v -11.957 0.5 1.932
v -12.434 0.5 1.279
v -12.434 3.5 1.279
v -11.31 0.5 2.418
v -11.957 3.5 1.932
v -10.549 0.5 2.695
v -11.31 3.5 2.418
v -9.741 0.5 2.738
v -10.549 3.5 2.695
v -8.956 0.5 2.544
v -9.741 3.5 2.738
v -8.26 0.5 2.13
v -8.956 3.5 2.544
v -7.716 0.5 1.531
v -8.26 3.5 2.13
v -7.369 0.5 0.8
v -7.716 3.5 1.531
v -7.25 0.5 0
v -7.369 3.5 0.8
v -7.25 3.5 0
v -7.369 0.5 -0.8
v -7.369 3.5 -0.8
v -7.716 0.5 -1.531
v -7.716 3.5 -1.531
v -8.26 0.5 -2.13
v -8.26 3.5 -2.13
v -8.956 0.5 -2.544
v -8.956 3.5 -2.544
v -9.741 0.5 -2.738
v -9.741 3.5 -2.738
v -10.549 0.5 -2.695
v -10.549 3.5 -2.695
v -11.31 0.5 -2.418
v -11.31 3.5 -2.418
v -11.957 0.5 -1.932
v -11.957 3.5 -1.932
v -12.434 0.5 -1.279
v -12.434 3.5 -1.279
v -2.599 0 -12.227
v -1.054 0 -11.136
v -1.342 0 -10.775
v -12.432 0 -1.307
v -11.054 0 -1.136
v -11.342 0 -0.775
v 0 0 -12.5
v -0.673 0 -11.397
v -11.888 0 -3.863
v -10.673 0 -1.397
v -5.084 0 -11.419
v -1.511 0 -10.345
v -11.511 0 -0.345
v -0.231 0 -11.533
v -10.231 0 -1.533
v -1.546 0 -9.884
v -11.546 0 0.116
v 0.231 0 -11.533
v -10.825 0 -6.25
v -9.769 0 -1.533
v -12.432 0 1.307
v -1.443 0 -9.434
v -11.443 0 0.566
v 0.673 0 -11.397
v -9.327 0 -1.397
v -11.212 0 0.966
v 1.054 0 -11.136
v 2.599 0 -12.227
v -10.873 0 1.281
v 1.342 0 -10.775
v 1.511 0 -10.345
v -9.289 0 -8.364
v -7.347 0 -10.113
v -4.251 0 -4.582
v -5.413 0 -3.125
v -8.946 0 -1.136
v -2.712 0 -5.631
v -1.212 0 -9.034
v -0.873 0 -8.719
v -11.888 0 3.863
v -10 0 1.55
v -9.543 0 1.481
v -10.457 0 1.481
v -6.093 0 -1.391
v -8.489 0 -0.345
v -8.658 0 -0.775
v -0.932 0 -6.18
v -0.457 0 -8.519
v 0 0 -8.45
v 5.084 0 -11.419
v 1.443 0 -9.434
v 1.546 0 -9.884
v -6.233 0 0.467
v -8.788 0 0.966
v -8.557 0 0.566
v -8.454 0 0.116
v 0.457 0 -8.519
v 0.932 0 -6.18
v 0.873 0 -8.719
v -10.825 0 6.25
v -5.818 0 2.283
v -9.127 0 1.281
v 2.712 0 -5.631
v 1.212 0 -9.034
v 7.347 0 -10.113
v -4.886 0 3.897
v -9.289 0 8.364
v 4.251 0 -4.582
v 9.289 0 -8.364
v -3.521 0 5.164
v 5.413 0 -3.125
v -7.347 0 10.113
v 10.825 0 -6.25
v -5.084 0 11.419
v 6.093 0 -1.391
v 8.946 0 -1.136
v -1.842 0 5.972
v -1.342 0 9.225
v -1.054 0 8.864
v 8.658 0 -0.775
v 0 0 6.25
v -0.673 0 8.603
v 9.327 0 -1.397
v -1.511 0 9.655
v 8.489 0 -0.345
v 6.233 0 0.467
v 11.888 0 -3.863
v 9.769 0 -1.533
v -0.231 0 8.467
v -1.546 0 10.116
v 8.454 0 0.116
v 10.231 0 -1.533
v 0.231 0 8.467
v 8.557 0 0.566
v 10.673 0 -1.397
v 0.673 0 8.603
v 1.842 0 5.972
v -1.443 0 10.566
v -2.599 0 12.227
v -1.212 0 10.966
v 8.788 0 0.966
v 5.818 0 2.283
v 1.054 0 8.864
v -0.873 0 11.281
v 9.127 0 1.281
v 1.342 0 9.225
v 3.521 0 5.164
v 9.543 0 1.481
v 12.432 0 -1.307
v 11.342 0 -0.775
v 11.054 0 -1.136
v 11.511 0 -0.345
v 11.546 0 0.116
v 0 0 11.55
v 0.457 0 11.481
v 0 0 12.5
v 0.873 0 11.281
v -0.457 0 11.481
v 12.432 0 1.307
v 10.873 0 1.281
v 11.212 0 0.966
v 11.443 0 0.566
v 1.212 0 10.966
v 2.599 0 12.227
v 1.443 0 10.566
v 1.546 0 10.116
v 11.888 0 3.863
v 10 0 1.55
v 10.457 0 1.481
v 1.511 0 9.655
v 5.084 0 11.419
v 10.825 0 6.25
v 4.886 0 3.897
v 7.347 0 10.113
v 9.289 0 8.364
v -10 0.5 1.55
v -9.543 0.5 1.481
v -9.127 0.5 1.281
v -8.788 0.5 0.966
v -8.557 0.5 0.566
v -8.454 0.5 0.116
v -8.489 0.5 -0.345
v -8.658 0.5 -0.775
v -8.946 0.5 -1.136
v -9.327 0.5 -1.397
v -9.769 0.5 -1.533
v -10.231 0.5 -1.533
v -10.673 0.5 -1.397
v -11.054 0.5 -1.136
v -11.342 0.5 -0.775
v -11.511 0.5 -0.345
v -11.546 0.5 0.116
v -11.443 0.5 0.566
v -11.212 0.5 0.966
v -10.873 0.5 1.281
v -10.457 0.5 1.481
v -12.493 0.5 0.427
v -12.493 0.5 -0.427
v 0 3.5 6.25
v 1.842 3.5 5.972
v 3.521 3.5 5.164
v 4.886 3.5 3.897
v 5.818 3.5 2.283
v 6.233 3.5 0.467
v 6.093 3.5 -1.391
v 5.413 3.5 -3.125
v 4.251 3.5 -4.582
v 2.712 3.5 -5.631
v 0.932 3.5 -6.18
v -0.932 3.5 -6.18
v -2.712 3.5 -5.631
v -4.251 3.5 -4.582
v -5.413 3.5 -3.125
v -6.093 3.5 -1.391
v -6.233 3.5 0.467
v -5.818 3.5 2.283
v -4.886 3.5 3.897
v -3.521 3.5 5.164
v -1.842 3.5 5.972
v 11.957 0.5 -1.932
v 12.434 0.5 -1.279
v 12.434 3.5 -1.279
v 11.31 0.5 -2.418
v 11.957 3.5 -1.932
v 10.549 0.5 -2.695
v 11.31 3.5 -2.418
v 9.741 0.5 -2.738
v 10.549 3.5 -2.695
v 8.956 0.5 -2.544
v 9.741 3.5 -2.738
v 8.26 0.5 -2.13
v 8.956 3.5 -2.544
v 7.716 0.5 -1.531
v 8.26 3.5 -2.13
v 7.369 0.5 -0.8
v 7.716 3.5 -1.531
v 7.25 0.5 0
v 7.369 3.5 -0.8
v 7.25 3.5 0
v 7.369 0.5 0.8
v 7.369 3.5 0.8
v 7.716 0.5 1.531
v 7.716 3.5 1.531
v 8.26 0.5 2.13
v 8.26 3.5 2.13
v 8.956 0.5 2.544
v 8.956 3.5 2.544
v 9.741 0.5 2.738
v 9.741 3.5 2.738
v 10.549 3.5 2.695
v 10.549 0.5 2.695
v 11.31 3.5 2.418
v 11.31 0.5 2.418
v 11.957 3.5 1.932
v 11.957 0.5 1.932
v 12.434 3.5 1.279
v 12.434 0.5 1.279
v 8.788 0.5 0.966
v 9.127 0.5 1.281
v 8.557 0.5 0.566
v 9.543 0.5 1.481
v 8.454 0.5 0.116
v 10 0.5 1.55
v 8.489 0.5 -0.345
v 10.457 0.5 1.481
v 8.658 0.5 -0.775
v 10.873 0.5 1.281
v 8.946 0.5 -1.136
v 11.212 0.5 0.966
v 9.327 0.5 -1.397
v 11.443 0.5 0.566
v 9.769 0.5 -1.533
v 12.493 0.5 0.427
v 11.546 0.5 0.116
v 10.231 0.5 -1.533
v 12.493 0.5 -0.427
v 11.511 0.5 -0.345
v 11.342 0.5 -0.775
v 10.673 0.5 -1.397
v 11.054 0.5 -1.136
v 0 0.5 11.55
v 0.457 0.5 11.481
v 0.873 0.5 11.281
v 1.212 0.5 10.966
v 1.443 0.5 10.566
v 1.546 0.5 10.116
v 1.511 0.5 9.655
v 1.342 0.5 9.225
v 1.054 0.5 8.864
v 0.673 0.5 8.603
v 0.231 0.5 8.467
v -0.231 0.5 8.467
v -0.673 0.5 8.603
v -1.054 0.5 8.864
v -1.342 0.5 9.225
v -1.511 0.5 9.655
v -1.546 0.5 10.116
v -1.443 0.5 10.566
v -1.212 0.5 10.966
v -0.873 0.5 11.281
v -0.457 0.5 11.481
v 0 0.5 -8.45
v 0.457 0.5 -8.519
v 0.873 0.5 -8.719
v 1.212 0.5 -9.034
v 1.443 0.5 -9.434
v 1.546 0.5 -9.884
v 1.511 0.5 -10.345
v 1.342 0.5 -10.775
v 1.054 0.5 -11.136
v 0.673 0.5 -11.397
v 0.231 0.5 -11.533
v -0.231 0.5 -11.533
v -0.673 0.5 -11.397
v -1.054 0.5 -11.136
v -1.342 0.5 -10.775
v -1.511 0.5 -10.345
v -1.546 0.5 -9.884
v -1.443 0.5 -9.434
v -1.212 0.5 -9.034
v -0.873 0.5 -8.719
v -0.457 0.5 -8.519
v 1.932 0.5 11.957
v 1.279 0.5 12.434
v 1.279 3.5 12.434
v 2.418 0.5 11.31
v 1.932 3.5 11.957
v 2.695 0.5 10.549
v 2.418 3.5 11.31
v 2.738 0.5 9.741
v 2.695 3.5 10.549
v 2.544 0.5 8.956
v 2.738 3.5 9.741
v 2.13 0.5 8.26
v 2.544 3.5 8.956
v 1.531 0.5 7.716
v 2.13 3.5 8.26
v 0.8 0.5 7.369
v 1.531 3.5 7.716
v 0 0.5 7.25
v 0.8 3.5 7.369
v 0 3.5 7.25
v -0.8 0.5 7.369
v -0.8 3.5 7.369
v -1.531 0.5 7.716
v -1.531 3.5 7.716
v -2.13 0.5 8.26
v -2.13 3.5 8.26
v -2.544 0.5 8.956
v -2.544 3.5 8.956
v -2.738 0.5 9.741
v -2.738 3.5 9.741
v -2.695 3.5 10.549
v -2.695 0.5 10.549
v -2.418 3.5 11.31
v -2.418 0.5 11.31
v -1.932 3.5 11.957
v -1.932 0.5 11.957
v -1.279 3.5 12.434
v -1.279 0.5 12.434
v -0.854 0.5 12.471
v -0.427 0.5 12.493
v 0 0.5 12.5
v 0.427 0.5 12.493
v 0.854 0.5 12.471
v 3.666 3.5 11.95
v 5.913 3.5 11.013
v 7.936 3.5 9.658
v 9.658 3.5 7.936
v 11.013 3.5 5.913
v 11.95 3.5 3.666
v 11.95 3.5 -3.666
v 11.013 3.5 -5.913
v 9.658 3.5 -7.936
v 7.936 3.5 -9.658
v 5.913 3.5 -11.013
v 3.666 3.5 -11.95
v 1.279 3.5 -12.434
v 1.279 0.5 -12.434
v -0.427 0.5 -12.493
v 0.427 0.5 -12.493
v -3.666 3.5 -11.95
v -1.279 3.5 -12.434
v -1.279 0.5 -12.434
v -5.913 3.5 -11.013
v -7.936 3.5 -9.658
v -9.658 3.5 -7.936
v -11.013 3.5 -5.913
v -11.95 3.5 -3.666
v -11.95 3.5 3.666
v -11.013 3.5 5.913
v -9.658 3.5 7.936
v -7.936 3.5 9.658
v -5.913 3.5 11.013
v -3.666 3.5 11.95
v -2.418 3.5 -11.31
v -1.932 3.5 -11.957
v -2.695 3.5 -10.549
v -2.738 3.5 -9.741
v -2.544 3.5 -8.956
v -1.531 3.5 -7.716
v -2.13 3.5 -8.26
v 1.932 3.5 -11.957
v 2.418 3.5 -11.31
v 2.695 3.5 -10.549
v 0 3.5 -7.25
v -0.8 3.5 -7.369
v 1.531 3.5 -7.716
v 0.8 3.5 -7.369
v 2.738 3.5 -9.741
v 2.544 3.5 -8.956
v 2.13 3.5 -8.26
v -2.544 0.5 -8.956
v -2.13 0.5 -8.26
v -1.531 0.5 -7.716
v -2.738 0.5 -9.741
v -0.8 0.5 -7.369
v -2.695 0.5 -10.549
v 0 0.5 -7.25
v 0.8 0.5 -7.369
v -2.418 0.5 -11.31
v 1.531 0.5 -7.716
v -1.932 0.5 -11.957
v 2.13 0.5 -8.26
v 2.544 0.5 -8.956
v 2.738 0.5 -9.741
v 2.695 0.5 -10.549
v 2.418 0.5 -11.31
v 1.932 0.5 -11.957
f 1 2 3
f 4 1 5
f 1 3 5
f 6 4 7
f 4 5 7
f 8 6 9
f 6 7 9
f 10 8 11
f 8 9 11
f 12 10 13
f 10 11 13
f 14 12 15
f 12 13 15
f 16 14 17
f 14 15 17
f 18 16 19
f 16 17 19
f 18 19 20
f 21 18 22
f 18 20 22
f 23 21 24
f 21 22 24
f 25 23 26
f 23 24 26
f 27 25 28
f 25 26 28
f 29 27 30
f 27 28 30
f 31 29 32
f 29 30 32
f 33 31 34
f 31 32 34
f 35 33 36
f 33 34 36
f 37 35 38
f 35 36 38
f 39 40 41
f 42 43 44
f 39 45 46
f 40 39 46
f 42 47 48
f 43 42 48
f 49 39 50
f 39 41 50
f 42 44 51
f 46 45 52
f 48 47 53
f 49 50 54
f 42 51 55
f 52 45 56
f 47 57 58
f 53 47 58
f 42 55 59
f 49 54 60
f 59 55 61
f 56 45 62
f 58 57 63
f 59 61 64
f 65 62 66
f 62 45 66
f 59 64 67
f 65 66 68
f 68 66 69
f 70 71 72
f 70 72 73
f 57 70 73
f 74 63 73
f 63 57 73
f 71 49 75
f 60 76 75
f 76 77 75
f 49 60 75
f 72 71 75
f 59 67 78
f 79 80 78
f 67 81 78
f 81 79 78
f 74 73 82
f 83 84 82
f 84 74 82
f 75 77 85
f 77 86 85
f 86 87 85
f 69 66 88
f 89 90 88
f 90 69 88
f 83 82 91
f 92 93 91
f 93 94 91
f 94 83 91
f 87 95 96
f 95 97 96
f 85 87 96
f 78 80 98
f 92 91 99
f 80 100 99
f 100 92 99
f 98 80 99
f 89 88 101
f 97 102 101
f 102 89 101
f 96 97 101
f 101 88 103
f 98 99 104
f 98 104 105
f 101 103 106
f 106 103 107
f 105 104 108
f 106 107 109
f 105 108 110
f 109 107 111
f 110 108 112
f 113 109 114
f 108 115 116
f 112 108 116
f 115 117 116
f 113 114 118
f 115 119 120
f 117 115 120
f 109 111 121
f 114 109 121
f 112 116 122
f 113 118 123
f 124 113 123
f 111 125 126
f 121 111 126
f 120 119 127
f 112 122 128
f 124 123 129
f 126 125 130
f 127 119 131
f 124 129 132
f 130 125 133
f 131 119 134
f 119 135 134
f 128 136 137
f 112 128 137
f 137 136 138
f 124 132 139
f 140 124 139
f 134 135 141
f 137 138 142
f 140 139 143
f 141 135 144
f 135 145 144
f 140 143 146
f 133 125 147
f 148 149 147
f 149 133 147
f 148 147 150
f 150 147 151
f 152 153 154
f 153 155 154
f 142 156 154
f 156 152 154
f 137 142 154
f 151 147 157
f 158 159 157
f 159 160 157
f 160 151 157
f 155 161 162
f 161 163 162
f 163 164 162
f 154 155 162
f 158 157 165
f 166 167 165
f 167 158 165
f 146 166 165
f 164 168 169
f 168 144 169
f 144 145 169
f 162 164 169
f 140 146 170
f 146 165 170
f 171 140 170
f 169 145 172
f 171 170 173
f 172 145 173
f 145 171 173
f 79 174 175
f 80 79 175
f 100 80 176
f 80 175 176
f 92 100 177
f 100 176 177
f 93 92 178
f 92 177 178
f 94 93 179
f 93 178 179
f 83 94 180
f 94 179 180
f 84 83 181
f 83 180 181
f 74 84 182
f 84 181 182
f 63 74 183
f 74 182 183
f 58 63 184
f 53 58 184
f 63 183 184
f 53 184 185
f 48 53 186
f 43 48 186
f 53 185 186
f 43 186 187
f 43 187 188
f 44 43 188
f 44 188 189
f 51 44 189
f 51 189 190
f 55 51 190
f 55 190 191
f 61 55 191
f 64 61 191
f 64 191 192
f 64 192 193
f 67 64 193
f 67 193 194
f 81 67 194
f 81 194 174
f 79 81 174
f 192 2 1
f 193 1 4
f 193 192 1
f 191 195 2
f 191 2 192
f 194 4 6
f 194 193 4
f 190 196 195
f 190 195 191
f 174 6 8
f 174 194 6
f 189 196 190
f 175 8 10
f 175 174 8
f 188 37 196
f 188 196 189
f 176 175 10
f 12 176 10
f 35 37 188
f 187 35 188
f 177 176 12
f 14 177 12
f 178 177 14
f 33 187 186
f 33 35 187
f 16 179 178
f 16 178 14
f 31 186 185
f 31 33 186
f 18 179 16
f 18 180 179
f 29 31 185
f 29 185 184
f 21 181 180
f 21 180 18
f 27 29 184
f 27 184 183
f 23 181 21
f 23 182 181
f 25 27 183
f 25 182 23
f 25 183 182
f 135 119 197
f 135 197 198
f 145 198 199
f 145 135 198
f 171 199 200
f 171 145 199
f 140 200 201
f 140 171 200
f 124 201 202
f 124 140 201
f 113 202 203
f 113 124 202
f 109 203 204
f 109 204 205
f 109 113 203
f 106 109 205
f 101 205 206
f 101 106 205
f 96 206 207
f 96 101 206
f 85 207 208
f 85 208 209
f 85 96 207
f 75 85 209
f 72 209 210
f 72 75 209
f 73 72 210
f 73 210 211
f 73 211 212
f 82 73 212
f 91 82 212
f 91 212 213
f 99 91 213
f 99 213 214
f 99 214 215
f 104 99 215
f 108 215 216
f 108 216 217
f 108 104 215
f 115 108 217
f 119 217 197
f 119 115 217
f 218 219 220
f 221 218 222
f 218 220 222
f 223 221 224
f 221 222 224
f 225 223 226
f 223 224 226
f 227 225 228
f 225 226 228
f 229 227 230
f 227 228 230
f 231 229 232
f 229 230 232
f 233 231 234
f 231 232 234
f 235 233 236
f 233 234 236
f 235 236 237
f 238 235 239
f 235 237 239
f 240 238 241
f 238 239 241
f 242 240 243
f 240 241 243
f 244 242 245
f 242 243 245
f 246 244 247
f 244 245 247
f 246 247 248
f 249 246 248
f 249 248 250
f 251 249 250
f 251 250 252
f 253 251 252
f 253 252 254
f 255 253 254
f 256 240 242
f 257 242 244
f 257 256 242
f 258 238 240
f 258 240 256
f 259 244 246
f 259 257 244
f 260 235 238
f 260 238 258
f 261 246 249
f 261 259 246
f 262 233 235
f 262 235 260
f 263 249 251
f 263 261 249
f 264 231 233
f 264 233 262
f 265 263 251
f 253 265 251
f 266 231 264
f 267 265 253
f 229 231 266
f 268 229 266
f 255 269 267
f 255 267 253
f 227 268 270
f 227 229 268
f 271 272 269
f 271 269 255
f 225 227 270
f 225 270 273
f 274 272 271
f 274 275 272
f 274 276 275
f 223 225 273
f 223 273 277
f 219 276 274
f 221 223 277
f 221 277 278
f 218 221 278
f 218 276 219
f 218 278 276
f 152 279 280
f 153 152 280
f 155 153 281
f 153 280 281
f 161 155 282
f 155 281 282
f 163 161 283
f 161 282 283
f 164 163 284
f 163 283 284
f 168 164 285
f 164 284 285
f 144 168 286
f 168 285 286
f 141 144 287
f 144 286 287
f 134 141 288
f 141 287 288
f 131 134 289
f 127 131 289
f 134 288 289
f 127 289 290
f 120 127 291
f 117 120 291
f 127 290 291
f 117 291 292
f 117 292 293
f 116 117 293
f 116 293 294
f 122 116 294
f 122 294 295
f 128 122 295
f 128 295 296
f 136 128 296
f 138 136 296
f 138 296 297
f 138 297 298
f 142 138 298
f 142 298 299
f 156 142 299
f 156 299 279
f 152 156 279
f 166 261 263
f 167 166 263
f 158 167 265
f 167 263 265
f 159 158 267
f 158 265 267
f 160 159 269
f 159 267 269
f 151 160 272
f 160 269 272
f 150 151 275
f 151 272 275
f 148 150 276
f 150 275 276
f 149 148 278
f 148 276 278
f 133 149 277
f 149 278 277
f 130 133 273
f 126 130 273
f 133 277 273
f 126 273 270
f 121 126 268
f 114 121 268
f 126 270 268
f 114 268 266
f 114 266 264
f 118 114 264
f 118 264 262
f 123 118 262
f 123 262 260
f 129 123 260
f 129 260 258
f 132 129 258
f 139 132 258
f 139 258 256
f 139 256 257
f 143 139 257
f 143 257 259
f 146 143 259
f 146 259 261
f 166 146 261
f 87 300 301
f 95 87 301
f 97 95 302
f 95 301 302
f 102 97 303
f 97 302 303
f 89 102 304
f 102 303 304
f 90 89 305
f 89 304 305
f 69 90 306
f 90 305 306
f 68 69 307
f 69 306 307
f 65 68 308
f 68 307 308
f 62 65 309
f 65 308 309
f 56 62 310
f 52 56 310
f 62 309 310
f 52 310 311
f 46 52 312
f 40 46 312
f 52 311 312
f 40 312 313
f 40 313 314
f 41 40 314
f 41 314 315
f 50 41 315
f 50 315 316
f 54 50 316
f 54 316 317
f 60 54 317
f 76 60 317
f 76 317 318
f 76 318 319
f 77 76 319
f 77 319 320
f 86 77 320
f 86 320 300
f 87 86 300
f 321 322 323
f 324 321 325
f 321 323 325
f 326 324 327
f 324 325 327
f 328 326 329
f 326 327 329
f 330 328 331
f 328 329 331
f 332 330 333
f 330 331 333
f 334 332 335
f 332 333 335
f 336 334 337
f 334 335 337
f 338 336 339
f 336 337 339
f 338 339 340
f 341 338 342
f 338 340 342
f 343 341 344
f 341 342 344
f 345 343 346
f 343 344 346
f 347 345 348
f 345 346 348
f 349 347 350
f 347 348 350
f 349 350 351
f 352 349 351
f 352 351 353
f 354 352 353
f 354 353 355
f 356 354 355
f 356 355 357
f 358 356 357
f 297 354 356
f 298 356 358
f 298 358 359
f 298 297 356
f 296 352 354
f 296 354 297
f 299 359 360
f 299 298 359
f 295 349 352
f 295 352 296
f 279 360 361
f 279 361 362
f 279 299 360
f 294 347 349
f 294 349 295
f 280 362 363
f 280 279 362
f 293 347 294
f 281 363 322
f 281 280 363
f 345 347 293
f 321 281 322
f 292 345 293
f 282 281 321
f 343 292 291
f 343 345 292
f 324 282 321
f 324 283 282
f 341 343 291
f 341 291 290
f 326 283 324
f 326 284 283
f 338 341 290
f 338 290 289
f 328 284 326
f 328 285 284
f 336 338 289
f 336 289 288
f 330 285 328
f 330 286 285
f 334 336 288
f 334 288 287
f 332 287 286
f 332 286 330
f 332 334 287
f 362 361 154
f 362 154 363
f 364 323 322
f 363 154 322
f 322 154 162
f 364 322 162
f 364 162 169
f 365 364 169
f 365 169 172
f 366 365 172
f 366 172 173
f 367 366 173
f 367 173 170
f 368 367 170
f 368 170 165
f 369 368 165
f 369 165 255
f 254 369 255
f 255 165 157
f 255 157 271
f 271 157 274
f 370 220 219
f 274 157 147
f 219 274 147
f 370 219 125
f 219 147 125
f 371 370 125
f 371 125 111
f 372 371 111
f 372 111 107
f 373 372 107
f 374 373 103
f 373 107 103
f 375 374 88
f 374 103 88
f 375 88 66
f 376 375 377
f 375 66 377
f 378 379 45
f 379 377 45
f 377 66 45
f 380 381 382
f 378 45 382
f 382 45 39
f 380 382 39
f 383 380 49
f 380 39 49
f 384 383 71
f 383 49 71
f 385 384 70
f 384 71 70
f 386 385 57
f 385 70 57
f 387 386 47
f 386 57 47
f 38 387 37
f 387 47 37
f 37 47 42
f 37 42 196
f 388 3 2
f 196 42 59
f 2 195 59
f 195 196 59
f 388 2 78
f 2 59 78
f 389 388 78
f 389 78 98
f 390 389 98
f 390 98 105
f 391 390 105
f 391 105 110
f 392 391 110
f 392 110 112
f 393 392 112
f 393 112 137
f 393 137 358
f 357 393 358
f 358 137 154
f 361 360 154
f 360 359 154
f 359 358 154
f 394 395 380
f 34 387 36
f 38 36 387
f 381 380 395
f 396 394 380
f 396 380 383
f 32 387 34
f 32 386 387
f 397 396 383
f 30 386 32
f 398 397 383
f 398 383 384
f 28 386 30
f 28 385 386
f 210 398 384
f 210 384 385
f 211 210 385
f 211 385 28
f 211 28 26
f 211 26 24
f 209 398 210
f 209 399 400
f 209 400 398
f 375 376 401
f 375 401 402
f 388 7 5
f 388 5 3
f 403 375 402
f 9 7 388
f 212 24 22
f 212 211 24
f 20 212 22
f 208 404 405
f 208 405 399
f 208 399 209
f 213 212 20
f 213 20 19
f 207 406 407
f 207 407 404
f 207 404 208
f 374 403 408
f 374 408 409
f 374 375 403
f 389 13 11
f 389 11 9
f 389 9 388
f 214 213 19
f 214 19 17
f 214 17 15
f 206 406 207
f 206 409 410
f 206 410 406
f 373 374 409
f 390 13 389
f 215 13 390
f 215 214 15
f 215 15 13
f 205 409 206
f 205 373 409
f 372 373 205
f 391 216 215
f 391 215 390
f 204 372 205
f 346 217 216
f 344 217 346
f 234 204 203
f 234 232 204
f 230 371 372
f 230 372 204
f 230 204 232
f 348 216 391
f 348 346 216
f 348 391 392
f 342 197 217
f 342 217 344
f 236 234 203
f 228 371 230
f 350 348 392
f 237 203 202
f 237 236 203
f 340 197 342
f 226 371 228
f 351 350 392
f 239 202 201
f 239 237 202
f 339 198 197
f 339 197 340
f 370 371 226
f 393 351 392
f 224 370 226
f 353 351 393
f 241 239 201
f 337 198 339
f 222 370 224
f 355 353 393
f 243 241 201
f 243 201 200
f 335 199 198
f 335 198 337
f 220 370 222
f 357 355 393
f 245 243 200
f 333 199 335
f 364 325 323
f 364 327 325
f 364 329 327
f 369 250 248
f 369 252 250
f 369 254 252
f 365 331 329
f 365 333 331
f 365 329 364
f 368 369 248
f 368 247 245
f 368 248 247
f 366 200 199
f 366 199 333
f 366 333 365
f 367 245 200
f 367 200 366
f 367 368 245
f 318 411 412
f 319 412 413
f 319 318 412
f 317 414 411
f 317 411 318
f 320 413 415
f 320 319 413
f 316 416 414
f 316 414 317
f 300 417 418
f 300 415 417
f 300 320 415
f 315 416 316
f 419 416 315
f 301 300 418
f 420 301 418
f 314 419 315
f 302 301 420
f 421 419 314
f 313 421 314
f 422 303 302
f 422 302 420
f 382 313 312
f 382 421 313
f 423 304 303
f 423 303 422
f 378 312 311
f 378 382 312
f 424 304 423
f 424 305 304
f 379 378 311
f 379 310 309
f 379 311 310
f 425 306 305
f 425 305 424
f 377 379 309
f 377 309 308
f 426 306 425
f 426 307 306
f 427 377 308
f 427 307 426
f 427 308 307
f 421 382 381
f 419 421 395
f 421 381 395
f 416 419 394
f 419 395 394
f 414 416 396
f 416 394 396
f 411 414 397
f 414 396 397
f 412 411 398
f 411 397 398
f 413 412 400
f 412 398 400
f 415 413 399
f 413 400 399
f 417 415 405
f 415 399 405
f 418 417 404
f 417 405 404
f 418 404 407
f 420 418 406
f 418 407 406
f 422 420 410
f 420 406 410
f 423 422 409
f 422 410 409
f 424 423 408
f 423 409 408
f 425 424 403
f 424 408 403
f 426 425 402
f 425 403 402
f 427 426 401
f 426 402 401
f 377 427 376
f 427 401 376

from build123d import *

# Parameters (mm, degrees)
SKETCH_1_R          = 12.5
SKETCH_1_R_2        = 6.25
EXTRUDE_1_DEPTH     = 3.5
SKETCH_2_R          = 1.55
CUT_EXTRUDE_1_DEPTH = 10
SKETCH_3_R          = 2.75
CUT_EXTRUDE_2_DEPTH = 3


with BuildPart() as part:
    # 草图1 → 凸台-拉伸1 (new body)
    with BuildSketch(Plane(origin=(0, 0, 0), x_dir=(1, 0, 0), z_dir=(0, 1, 0))):
        with Locations(Location((0, 0, 0), (0, 0, 270))):
            Circle(SKETCH_1_R)
        with Locations(Location((0, 0, 0), (0, 0, 270))):
            Circle(SKETCH_1_R_2, mode=Mode.SUBTRACT)
    extrude(amount=EXTRUDE_1_DEPTH)

    # 草图2 → 切除-拉伸1 (cut)
    with BuildSketch(Plane(origin=(0, 3.5, 0), x_dir=(1, 0, 0), z_dir=(0, 1, 0))):
        with Locations(Location((-10, 0, 0), (0, 0, 270))):
            Circle(SKETCH_2_R)
        with Locations(Location((0, 10, 0), (0, 0, 270))):
            Circle(SKETCH_2_R)
        with Locations(Location((10, 0, 0), (0, 0, 270))):
            Circle(SKETCH_2_R)
        with Locations(Location((0, -10, 0), (0, 0, 270))):
            Circle(SKETCH_2_R)
    extrude(amount=-CUT_EXTRUDE_1_DEPTH, mode=Mode.SUBTRACT)

    # 草图3 → 切除-拉伸2 (cut)
    with BuildSketch(Plane(origin=(0, 3.5, 0), x_dir=(1, 0, 0), z_dir=(0, 1, 0))):
        with Locations((-10, 0)):
            Circle(SKETCH_3_R)
        with Locations((0, 10)):
            Circle(SKETCH_3_R)
        with Locations((10, 0)):
            Circle(SKETCH_3_R)
        with Locations((0, -10)):
            Circle(SKETCH_3_R)
    extrude(amount=-CUT_EXTRUDE_2_DEPTH, mode=Mode.SUBTRACT)


solid = part.part
